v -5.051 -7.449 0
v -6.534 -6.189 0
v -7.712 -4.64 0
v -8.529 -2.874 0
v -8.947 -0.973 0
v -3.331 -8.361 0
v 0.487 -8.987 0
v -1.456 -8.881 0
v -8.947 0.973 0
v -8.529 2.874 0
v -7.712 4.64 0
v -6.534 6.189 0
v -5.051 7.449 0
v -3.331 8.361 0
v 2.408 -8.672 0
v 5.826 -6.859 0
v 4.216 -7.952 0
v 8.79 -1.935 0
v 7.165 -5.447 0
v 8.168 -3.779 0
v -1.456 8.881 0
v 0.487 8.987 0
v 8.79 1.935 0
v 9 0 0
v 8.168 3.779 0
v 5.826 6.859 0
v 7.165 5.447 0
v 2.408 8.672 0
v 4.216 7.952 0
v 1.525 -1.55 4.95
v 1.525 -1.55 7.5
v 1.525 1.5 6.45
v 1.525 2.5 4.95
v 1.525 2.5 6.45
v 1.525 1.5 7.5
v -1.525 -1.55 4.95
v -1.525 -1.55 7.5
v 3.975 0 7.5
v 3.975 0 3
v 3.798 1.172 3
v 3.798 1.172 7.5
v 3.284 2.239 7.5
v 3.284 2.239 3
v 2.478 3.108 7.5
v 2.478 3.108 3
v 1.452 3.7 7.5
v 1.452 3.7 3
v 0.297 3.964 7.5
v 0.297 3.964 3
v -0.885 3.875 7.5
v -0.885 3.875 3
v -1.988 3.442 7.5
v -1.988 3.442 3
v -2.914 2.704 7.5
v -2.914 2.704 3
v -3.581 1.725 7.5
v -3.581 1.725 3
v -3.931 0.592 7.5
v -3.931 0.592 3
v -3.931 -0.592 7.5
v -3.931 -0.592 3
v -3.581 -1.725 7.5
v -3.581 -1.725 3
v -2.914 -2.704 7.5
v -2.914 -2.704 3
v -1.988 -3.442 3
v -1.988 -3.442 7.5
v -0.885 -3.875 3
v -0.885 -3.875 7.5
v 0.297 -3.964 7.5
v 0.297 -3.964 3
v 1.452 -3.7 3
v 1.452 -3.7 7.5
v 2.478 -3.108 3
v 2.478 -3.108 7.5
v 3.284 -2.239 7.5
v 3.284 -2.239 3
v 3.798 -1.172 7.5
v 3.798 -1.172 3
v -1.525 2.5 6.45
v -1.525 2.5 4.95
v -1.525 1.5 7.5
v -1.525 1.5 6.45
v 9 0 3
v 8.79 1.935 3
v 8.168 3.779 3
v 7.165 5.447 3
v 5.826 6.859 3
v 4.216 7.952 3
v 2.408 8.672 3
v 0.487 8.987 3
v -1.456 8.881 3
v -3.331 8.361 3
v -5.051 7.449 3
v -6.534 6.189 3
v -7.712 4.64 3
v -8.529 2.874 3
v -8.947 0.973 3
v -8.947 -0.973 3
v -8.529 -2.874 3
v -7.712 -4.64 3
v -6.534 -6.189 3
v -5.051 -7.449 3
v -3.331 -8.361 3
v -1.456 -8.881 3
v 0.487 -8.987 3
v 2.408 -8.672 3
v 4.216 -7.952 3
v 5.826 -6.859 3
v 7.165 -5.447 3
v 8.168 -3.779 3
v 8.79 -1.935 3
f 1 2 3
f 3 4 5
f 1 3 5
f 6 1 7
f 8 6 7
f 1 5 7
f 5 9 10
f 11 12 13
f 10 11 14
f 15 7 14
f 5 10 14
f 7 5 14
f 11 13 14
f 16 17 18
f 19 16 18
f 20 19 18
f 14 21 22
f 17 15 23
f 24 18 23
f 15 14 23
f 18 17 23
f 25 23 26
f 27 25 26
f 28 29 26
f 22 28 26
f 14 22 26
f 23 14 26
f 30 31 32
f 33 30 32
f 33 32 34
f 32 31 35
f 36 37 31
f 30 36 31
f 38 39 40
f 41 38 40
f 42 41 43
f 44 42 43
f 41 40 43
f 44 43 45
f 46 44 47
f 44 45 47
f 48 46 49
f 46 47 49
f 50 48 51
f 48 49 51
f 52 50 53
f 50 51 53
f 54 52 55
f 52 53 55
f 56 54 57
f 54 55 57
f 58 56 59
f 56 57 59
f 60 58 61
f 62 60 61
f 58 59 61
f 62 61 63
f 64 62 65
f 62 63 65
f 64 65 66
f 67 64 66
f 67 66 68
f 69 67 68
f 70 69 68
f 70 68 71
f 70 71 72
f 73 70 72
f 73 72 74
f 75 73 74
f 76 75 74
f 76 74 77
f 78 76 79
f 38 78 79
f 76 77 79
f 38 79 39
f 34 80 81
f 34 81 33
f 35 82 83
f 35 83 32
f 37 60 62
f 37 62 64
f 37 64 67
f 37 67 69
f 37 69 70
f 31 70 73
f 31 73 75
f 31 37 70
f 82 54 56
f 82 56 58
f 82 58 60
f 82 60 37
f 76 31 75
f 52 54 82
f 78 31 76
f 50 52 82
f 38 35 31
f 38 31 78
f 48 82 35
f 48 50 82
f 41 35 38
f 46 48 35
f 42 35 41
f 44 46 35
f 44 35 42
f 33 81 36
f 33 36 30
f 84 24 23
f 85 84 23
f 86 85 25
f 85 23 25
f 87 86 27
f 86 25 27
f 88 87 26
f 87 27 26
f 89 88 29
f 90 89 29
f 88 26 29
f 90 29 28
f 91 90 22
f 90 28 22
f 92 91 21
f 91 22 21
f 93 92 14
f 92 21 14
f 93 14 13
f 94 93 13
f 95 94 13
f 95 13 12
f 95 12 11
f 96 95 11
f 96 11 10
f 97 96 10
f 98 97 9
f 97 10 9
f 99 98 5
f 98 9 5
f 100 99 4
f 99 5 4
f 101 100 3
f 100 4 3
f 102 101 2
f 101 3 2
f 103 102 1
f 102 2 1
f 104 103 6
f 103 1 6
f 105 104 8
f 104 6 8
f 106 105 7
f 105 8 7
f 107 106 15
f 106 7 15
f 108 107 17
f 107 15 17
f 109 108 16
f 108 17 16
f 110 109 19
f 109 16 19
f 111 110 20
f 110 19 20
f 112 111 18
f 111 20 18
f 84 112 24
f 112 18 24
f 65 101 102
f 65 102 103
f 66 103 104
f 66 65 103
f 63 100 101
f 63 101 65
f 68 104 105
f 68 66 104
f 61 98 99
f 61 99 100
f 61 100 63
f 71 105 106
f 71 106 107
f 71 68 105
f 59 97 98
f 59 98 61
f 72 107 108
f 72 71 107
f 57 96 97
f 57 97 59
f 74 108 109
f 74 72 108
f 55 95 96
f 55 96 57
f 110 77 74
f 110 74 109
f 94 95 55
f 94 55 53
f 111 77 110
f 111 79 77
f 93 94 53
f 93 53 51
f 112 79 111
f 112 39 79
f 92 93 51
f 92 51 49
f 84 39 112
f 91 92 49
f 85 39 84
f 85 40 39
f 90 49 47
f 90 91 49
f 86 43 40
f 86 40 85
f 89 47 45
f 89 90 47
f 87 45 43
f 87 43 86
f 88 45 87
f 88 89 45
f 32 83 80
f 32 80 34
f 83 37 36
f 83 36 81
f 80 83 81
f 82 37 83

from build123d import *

# Parameters (mm, degrees)
F0_R     = 9
F1_DEPTH = 3
F2_R     = 3.975
F3_DEPTH = 4.5
F4_W     = 3.05
F4_H     = 3.05
F5_DEPTH = 2.55
F6_W     = 3.05
F6_H     = 1.5
F7_DEPTH = 1


with BuildPart() as f1:
    # F0 (on Top) → F1 (new body)
    with BuildSketch(Plane.XY):
        Circle(F0_R)
    extrude(amount=F1_DEPTH)

    # F2 (on face) → F3 (join)
    with BuildSketch(Plane.XY.offset(3)):
        Circle(F2_R)
    extrude(amount=F3_DEPTH)

    # F4 (on face) → F5 (cut)
    with BuildSketch(Plane.XY.offset(7.5)):
        with Locations((0, -0.025)):
            Rectangle(F4_W, F4_H)
    extrude(amount=-F5_DEPTH, mode=Mode.SUBTRACT)

    # F6 (on face) → F7 (cut)
    with BuildSketch(Plane.XZ.offset(-1.5)):
        with Locations((0, 5.7)):
            Rectangle(F6_W, F6_H)
    extrude(amount=-F7_DEPTH, mode=Mode.SUBTRACT)


solid = f1.part
